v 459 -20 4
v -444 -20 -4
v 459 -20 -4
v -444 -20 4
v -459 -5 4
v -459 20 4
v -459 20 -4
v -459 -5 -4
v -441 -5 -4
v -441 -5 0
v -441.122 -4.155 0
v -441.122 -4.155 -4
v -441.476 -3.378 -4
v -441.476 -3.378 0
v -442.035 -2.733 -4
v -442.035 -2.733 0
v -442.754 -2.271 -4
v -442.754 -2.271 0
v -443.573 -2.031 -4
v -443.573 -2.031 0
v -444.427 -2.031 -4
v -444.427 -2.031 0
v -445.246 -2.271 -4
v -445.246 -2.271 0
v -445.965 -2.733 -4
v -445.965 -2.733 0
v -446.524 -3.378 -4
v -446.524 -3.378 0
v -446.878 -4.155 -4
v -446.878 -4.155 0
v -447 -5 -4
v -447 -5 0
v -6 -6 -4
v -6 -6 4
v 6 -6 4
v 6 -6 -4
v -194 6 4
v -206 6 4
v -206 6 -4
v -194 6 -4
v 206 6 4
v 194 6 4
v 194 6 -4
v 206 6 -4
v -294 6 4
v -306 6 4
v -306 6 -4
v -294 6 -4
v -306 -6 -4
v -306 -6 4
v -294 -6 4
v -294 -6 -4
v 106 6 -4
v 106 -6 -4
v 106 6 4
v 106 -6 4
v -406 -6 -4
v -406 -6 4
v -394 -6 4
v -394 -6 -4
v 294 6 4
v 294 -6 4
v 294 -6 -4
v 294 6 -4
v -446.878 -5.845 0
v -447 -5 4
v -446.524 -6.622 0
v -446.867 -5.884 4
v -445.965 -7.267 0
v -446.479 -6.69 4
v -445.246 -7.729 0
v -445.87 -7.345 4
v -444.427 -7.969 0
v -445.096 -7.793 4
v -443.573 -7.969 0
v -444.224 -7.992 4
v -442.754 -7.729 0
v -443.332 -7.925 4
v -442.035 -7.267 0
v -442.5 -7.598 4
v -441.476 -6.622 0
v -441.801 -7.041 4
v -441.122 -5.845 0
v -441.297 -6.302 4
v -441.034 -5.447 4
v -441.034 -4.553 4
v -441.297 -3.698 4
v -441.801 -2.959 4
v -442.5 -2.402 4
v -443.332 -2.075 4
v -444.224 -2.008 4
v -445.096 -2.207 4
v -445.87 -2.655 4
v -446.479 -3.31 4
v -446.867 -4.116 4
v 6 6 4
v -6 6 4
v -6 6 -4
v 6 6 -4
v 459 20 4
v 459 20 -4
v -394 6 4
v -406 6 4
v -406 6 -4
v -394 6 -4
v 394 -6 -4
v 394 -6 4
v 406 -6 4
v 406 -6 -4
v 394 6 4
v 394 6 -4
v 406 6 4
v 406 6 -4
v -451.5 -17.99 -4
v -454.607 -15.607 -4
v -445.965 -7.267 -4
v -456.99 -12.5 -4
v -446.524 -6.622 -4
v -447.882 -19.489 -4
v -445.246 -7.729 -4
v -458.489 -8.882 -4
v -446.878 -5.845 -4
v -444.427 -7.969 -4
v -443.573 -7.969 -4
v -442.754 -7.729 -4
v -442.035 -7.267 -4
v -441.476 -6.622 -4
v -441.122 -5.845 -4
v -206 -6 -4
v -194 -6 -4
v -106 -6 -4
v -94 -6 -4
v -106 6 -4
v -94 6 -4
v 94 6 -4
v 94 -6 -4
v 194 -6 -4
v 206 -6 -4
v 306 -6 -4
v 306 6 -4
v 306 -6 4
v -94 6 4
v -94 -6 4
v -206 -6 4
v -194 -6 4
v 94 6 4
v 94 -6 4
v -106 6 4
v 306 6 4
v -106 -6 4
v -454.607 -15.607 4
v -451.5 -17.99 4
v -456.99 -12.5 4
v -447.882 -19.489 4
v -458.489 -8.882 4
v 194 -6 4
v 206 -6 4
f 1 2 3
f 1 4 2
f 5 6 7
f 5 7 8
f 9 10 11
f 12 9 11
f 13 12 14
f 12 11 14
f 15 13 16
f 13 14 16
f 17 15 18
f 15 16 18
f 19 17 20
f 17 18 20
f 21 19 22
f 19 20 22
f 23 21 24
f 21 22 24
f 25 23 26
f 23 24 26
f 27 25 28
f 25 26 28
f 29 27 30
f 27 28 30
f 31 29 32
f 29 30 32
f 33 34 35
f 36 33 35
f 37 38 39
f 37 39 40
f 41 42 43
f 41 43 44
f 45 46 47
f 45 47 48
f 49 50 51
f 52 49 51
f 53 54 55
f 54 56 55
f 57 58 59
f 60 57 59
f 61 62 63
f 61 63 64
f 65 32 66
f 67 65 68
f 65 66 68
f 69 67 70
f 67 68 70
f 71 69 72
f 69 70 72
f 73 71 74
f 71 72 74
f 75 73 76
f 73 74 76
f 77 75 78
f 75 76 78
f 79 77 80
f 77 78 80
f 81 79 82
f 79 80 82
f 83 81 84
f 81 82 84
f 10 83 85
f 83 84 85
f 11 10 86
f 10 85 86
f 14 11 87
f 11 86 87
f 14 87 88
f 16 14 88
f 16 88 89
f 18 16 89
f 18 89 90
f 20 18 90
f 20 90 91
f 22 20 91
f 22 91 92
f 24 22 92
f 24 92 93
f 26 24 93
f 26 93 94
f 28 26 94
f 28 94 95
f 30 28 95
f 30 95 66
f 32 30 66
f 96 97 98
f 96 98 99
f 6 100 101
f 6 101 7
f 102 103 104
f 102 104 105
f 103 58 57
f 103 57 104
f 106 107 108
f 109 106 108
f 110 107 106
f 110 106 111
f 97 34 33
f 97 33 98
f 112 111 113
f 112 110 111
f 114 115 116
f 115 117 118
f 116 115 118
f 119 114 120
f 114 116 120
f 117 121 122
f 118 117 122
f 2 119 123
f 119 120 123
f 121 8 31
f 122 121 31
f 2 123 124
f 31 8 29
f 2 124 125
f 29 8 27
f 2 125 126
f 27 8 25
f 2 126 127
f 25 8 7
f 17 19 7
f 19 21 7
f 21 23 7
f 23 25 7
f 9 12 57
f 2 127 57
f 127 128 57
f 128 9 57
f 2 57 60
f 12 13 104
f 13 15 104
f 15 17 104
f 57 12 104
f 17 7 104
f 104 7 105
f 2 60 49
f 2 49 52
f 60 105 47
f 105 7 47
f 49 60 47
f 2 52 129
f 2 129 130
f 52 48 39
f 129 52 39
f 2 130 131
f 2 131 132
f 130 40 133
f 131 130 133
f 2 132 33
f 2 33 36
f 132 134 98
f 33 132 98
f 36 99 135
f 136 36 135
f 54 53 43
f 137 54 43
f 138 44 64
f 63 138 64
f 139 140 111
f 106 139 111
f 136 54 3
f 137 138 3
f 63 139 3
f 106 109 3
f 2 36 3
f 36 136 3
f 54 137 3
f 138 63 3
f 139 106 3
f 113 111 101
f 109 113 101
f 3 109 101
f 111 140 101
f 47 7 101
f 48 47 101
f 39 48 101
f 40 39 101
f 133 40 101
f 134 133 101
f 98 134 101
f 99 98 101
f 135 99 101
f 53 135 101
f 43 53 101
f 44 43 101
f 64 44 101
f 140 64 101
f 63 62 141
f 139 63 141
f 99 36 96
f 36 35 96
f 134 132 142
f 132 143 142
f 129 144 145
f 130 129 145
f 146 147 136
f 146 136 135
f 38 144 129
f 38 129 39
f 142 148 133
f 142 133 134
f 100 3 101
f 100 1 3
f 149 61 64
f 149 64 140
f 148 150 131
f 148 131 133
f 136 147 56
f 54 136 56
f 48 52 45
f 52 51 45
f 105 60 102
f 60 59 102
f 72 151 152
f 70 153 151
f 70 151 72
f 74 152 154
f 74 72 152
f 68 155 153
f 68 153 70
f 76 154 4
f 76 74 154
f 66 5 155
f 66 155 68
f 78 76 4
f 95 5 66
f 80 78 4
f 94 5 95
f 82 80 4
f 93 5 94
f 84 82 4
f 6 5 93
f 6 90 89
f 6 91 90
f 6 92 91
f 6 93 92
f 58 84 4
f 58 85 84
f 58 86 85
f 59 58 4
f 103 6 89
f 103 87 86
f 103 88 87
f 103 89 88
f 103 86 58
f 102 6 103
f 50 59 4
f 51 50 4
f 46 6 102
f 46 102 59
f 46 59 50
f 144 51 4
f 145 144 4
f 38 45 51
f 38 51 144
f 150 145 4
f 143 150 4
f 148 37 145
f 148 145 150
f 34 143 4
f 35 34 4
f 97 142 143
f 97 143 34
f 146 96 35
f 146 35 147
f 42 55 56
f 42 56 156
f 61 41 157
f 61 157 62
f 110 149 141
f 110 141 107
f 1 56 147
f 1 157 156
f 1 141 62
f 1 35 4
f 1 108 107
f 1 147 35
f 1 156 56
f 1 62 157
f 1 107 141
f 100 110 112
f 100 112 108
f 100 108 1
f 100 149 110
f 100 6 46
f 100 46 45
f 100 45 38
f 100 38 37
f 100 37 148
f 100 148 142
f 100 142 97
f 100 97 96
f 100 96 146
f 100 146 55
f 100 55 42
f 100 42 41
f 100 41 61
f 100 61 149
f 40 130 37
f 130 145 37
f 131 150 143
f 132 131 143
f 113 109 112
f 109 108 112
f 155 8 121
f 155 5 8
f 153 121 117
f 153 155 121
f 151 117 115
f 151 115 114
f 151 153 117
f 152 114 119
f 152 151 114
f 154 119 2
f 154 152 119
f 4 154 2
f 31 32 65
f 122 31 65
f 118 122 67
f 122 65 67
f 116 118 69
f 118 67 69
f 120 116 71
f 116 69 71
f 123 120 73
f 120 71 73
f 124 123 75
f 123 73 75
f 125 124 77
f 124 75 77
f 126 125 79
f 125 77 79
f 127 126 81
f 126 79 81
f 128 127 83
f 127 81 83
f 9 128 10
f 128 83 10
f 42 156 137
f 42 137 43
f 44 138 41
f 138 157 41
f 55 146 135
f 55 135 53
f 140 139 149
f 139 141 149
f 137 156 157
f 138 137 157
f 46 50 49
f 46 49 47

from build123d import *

# Parameters (mm, degrees)
F0_W     = 12
F0_H     = 12
F1_DEPTH = 4
F2_D     = 6
F2_DEPTH = 4.001
F3_D     = 6


with BuildPart() as f1:
    # F0 (on Top) → F1 (new body, symmetric)
    with BuildSketch(Plane.XY):
        with BuildLine():
            Line((459, -20), (459, 20))
            Line((459, 20), (-459, 20))
            Line((-459, 20), (-459, -5))
            ThreePointArc((-459, -5), (-454.6066017178, -15.6066017178), (-444, -20))
            Line((-444, -20), (459, -20))
        make_face()
        with Locations((-400, 0)):
            Rectangle(F0_W, F0_H, mode=Mode.SUBTRACT)
        with Locations((-300, 0)):
            Rectangle(F0_W, F0_H, mode=Mode.SUBTRACT)
        with Locations((-200, 0)):
            Rectangle(F0_W, F0_H, mode=Mode.SUBTRACT)
        with Locations((-100, 0)):
            Rectangle(F0_W, F0_H, mode=Mode.SUBTRACT)
        Rectangle(F0_W, F0_H, mode=Mode.SUBTRACT)
        with Locations((100, 0)):
            Rectangle(F0_W, F0_H, mode=Mode.SUBTRACT)
        with Locations((200, 0)):
            Rectangle(F0_W, F0_H, mode=Mode.SUBTRACT)
        with Locations((300, 0)):
            Rectangle(F0_W, F0_H, mode=Mode.SUBTRACT)
        with Locations((400, 0)):
            Rectangle(F0_W, F0_H, mode=Mode.SUBTRACT)
    extrude(amount=F1_DEPTH, both=True)

    # F2 (through all, one way)
    with BuildSketch(Plane.XY):
        with Locations((-444, -5)):
            Circle(F2_D / 2)
    extrude(amount=-F2_DEPTH, mode=Mode.SUBTRACT)

    # F3 (through all)
    with Locations(Plane(origin=(0, 0, 0), x_dir=(1, 0, 0), z_dir=(0, 0, -1))):
        with Locations((-444, 5)):
            Hole(F3_D / 2)


solid = f1.part
